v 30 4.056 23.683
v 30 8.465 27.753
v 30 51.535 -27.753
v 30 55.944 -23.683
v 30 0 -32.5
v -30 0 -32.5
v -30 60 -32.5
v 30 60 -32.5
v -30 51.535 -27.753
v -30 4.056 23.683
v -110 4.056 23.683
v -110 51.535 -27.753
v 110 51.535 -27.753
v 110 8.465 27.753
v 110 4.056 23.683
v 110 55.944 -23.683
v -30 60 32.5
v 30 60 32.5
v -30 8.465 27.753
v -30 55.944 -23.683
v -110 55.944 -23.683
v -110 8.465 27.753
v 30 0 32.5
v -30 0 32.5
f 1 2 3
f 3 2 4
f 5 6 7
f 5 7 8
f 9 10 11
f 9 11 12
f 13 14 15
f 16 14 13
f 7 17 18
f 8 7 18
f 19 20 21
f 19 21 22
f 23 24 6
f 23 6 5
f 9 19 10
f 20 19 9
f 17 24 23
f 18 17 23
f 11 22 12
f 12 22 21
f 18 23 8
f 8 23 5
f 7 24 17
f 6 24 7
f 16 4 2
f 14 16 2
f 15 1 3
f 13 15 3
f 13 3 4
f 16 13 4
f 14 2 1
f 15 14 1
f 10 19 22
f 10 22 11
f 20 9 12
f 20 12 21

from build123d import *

# Parameters (mm, degrees)
SKETCH1_W           = 60
SKETCH1_H           = 65
BOSS_EXTRUDE1_DEPTH = 60
BOSS_EXTRUDE2_DEPTH = 80


with BuildPart() as part:
    # Sketch1 → Boss-Extrude1 (new body)
    with BuildSketch(Plane(origin=(0, 0, 0), x_dir=(1, 0, 0), z_dir=(0, 1, 0))):
        Rectangle(SKETCH1_W, SKETCH1_H)
    extrude(amount=BOSS_EXTRUDE1_DEPTH)


with BuildPart() as body_2:
    # Sketch2 → Boss-Extrude2 (new body)
    with BuildSketch(Plane(origin=(30, 0, 0), x_dir=(0, 0, -1), z_dir=(1, 0, 0))):
        Polygon((-27.75296087, 8.464606738), (-23.683280254, 4.05578607), (27.75296087, 51.535393262), (23.683280254, 55.94421393), align=None)
    extrude(amount=BOSS_EXTRUDE2_DEPTH)


with BuildPart() as body_3:
    # Mirror1: mirrored copy
    add(body_2.part.mirror(Plane(origin=(0, 0, 0), x_dir=(0, 0, 1), z_dir=(1, 0, 0))))


solid = Compound([part.part, body_2.part, body_3.part])
